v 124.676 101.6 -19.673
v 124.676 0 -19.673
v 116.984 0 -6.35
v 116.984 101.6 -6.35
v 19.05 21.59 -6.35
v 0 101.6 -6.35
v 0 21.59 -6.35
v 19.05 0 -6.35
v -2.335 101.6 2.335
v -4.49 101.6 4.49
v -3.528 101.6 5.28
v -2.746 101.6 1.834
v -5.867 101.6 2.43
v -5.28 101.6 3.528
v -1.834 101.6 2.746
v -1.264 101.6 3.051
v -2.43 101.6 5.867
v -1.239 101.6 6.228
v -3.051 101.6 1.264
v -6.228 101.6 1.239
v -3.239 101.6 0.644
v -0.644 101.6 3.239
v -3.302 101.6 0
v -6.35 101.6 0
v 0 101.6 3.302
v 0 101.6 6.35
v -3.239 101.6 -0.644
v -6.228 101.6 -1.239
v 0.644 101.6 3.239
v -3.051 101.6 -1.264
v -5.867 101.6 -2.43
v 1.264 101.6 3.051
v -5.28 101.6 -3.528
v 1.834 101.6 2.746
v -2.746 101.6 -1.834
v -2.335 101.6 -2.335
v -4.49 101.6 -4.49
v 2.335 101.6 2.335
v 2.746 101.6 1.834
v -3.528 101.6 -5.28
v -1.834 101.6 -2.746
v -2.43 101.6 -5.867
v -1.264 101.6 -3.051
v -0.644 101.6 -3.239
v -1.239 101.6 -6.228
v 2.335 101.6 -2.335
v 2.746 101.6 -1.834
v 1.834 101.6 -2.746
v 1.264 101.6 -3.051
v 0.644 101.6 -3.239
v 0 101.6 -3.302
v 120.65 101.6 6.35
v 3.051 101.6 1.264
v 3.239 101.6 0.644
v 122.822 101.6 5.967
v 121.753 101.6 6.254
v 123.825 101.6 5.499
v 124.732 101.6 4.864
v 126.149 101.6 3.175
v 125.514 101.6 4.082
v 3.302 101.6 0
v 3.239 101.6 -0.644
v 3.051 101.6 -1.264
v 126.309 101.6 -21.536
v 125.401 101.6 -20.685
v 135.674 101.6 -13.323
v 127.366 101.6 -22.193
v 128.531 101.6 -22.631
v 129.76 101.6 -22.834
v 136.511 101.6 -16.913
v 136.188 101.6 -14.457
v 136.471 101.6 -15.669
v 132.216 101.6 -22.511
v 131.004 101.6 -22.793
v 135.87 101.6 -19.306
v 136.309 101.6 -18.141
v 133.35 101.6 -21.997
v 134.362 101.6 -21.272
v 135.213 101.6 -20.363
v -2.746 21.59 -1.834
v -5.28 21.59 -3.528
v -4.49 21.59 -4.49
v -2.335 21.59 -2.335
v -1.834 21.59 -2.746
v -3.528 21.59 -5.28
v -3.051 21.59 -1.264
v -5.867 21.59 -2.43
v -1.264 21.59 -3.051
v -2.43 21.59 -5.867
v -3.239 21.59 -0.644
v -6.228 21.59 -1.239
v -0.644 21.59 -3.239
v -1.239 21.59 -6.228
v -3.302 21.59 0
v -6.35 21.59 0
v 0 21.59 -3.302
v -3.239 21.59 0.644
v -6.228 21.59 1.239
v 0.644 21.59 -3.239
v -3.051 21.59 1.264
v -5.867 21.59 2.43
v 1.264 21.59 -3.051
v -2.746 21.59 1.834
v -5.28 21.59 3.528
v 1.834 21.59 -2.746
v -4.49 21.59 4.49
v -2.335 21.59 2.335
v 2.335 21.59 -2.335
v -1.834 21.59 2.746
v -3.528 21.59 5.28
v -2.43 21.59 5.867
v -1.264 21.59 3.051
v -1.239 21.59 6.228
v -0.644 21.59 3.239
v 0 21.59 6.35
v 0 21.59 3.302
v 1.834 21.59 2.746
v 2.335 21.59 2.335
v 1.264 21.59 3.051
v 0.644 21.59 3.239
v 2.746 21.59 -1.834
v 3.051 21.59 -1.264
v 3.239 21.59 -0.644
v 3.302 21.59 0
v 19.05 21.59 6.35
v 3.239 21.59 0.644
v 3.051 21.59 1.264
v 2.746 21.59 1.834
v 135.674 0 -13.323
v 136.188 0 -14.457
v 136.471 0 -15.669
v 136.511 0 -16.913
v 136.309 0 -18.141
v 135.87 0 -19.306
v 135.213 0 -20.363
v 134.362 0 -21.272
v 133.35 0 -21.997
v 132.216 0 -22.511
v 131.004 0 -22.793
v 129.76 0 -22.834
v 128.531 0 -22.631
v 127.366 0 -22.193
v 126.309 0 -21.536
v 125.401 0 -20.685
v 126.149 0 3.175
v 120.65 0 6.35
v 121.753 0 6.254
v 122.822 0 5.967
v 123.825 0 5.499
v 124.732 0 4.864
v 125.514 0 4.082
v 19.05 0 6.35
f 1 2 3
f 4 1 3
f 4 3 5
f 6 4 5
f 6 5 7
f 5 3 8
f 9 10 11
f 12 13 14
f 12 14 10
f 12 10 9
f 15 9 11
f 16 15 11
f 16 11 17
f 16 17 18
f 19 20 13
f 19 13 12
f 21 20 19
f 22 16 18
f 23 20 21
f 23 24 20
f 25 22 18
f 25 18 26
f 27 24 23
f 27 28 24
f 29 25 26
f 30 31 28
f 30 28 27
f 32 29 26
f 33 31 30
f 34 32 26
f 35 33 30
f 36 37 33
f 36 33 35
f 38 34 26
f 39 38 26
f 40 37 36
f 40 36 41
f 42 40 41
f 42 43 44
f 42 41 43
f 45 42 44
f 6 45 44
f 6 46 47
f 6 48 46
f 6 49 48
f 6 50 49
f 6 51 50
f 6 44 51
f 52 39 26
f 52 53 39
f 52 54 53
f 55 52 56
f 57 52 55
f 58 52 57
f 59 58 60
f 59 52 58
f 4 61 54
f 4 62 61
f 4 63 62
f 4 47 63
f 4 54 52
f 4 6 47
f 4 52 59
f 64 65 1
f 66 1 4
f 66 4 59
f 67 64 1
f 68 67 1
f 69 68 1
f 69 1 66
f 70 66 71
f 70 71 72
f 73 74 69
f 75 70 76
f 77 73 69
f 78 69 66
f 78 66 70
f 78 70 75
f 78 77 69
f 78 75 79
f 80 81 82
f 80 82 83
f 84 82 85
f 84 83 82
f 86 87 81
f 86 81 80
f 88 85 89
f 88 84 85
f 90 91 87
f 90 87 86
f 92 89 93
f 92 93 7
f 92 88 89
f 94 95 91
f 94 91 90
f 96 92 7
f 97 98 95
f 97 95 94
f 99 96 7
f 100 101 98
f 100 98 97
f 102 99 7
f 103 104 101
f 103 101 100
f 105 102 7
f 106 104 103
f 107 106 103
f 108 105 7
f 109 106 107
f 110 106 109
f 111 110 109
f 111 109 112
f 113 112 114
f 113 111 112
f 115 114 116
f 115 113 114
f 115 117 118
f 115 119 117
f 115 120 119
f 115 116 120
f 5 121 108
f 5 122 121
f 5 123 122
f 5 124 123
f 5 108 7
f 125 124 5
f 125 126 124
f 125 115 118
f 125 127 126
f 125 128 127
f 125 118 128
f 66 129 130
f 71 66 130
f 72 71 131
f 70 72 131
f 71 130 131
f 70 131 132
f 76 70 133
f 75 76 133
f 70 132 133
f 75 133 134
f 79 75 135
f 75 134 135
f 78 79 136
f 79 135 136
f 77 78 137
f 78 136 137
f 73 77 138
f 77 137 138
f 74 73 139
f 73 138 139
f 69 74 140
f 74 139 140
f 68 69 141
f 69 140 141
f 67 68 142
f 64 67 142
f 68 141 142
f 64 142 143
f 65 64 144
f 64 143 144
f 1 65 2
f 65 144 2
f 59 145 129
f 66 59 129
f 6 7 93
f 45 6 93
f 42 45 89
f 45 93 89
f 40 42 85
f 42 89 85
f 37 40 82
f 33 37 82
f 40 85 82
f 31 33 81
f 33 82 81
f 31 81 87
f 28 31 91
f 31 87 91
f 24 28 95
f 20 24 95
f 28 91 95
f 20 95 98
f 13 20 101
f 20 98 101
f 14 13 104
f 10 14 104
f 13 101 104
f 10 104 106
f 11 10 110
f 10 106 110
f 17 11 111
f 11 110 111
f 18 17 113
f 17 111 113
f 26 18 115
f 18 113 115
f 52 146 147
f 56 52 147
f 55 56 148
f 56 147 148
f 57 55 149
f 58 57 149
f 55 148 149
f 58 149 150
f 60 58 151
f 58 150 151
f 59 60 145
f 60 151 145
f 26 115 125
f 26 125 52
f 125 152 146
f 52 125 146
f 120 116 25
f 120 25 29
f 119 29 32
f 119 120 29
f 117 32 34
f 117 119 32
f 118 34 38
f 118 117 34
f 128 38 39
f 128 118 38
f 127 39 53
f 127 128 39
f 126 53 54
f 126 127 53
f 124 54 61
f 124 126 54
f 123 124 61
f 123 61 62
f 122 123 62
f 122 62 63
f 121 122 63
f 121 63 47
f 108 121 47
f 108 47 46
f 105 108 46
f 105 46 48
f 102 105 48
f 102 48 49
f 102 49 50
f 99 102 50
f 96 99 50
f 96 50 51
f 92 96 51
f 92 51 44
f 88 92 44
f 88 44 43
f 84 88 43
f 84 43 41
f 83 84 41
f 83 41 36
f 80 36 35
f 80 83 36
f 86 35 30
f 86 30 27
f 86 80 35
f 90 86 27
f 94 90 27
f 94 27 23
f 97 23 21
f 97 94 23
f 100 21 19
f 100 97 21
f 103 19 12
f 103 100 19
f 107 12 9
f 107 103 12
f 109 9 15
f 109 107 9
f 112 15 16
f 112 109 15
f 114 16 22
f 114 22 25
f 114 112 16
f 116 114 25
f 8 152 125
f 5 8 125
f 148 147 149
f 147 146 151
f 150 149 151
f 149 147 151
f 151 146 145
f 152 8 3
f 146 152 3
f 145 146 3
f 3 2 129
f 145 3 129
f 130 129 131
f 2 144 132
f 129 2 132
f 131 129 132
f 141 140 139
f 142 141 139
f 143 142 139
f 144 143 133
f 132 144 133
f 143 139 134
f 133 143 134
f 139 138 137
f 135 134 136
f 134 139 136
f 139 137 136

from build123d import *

# Parameters (mm, degrees)
SKETCH1_R           = 3.302
BOSS_EXTRUDE1_DEPTH = 101.6
SKETCH2_W           = 25.4
SKETCH2_H           = 21.59
CUT_EXTRUDE1_DEPTH  = 173.667733558


with BuildPart() as part:
    # Sketch1 → Boss-Extrude1 (new body)
    with BuildSketch(Plane(origin=(0, 0, 0), x_dir=(1, 0, 0), z_dir=(0, 1, 0))):
        with BuildLine():
            Line((116.983825791, 6.35), (0, 6.35))
            ThreePointArc((0, 6.35), (-6.35, 0), (0, -6.35))
            Line((0, -6.35), (120.65, -6.35))
            ThreePointArc((120.65, -6.35), (123.825, -5.499261314), (126.149261314, -3.175))
            Line((126.149261314, -3.175), (135.674261314, 13.322783942))
            ThreePointArc((135.674261314, 13.322783942), (133.35, 21.997045256), (124.675738686, 19.672783942))
            Line((124.675738686, 19.672783942), (116.983825791, 6.35))
        make_face()
        Circle(SKETCH1_R, mode=Mode.SUBTRACT)
    extrude(amount=BOSS_EXTRUDE1_DEPTH)

    # Sketch2 → Cut-Extrude1 (cut, through all)
    with BuildSketch(Plane.XY.offset(6.35)):
        with Locations((6.35, 10.795)):
            Rectangle(SKETCH2_W, SKETCH2_H)
    extrude(amount=-CUT_EXTRUDE1_DEPTH, mode=Mode.SUBTRACT)


solid = part.part
